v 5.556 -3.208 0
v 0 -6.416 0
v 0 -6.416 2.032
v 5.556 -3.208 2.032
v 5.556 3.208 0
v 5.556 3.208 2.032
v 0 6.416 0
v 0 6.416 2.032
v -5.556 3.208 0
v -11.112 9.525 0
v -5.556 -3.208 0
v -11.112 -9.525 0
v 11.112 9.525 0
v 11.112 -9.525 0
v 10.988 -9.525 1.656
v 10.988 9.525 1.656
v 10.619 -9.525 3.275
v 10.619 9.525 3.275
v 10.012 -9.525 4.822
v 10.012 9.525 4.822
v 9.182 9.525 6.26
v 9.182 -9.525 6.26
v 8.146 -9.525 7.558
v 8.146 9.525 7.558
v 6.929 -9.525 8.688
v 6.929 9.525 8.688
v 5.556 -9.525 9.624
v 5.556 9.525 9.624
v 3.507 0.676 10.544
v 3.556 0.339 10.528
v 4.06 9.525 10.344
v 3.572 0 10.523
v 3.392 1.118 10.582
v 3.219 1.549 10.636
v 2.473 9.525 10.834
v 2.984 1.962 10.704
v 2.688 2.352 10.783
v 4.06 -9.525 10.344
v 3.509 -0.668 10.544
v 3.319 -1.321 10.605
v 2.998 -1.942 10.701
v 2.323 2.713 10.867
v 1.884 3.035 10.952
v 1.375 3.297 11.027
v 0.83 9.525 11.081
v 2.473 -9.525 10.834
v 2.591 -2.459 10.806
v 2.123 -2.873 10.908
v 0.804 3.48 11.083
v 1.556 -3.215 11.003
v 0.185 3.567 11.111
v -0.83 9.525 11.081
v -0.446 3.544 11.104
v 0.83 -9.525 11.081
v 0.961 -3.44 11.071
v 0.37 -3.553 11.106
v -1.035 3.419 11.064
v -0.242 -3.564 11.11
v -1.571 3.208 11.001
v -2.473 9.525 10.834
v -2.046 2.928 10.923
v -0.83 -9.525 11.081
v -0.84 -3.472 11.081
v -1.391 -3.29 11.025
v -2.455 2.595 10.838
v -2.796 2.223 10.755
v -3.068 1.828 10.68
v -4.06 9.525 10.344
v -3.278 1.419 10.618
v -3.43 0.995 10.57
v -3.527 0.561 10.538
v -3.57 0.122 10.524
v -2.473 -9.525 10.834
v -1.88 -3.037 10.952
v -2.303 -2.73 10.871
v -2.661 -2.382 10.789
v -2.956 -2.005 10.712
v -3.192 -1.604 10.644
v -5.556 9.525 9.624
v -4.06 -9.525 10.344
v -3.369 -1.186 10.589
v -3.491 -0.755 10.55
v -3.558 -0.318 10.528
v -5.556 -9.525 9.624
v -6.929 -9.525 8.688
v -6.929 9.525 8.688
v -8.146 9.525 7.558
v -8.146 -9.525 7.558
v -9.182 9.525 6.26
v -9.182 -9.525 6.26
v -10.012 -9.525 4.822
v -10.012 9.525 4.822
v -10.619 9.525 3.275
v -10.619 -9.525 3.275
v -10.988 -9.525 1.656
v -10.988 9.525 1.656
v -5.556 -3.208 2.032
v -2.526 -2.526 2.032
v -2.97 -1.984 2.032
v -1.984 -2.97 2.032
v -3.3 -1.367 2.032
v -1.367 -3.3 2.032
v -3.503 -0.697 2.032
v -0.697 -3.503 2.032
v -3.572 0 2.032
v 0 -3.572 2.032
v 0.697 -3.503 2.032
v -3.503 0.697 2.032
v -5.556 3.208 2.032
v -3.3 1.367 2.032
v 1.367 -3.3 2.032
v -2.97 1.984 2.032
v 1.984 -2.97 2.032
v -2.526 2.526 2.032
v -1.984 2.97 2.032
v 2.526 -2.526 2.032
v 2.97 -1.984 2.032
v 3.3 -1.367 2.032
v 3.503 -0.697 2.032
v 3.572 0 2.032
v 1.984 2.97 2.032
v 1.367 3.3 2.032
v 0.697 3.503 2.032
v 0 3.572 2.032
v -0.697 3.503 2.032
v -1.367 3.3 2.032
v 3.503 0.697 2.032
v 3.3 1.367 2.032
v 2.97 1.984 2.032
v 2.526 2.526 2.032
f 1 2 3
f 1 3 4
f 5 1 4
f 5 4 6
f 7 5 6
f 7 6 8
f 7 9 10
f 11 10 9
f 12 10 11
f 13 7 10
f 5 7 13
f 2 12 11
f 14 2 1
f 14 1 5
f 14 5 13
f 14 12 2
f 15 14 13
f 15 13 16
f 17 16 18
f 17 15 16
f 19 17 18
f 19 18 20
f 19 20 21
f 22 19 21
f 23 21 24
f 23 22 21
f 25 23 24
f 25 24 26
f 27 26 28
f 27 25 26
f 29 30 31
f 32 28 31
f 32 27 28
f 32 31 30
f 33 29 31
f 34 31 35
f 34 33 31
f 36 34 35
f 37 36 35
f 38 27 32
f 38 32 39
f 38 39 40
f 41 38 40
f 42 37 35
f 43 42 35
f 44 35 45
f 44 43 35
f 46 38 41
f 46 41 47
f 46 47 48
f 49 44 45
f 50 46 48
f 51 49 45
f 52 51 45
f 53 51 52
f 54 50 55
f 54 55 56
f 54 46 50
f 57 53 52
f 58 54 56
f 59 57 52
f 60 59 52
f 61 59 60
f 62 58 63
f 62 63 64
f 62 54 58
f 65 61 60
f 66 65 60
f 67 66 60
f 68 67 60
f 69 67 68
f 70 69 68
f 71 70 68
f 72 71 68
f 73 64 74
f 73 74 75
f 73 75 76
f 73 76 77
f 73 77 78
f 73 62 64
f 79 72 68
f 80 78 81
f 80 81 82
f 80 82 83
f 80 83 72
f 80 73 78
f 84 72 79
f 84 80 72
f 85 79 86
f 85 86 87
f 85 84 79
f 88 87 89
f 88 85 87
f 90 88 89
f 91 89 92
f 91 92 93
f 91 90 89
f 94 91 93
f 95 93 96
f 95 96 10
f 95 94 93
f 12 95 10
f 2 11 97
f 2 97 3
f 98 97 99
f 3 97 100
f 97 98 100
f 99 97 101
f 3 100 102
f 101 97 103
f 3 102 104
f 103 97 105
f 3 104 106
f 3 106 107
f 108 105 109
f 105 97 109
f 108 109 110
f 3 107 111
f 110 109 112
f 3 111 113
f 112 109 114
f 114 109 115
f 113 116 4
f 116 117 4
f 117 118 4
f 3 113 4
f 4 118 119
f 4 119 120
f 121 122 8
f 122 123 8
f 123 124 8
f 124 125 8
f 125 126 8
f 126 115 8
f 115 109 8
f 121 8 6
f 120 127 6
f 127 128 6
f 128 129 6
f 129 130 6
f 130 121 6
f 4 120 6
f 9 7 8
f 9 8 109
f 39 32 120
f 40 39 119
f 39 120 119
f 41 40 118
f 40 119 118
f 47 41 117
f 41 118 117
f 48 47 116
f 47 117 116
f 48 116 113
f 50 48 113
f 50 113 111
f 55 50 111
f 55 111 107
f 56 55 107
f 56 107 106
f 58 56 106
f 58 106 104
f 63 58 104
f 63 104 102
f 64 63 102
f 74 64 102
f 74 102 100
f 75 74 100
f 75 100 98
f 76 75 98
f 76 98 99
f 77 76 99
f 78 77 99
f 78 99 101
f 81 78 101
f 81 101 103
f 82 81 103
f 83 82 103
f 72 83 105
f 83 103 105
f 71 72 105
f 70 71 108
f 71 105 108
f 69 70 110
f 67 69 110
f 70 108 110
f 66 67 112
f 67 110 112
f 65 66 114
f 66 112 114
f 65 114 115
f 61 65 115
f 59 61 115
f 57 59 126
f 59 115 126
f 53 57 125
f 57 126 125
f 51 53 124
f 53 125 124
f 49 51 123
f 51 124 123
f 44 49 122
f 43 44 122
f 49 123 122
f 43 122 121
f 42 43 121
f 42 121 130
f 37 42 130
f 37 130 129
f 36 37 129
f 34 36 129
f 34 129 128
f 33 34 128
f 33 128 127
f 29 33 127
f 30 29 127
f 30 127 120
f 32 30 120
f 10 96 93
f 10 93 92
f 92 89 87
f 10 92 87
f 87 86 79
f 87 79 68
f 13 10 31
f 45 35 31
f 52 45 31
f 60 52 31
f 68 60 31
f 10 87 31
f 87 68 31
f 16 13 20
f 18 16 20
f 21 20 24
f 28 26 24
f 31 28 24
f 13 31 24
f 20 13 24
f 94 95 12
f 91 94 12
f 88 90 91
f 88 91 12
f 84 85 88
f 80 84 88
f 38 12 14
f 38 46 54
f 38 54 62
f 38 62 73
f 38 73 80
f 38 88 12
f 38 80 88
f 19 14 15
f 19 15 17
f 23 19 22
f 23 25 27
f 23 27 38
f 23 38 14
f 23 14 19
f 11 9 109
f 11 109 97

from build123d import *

# Parameters (mm, degrees)
F2_DEPTH  = 9.525
F0_R      = 3.571875
F3_DEPTH  = 2.032
F3_FACE_R = 3.571875
F4_DEPTH  = 25.4


with BuildPart() as f2:
    # F1 (on Front) → F2 (new body, symmetric)
    with BuildSketch(Plane.XZ):
        with BuildLine():
            Line((-11.1125, 0), (11.1125, 0))
            ThreePointArc((11.1125, 0), (0, 11.1125), (-11.1125, 0))
        make_face()
    extrude(amount=F2_DEPTH, both=True)

    # F0 (on Top) → F3 (cut)
    with BuildSketch(Plane.XY):
        Polygon((5.55625, -3.207902), (5.55625, 3.207902), (0, 6.415805), (-5.55625, 3.207902), (-5.55625, -3.207902), (0, -6.415805), align=None)
        Circle(F0_R, mode=Mode.SUBTRACT)
    extrude(amount=F3_DEPTH, mode=Mode.SUBTRACT)

    # F3_face (on face) → F4 (cut)
    with BuildSketch(Plane(origin=(0, 0, 0), x_dir=(1, 0, 0), z_dir=(0, 0, -1))):
        Circle(F3_FACE_R)
    extrude(amount=-F4_DEPTH, mode=Mode.SUBTRACT)


solid = f2.part
